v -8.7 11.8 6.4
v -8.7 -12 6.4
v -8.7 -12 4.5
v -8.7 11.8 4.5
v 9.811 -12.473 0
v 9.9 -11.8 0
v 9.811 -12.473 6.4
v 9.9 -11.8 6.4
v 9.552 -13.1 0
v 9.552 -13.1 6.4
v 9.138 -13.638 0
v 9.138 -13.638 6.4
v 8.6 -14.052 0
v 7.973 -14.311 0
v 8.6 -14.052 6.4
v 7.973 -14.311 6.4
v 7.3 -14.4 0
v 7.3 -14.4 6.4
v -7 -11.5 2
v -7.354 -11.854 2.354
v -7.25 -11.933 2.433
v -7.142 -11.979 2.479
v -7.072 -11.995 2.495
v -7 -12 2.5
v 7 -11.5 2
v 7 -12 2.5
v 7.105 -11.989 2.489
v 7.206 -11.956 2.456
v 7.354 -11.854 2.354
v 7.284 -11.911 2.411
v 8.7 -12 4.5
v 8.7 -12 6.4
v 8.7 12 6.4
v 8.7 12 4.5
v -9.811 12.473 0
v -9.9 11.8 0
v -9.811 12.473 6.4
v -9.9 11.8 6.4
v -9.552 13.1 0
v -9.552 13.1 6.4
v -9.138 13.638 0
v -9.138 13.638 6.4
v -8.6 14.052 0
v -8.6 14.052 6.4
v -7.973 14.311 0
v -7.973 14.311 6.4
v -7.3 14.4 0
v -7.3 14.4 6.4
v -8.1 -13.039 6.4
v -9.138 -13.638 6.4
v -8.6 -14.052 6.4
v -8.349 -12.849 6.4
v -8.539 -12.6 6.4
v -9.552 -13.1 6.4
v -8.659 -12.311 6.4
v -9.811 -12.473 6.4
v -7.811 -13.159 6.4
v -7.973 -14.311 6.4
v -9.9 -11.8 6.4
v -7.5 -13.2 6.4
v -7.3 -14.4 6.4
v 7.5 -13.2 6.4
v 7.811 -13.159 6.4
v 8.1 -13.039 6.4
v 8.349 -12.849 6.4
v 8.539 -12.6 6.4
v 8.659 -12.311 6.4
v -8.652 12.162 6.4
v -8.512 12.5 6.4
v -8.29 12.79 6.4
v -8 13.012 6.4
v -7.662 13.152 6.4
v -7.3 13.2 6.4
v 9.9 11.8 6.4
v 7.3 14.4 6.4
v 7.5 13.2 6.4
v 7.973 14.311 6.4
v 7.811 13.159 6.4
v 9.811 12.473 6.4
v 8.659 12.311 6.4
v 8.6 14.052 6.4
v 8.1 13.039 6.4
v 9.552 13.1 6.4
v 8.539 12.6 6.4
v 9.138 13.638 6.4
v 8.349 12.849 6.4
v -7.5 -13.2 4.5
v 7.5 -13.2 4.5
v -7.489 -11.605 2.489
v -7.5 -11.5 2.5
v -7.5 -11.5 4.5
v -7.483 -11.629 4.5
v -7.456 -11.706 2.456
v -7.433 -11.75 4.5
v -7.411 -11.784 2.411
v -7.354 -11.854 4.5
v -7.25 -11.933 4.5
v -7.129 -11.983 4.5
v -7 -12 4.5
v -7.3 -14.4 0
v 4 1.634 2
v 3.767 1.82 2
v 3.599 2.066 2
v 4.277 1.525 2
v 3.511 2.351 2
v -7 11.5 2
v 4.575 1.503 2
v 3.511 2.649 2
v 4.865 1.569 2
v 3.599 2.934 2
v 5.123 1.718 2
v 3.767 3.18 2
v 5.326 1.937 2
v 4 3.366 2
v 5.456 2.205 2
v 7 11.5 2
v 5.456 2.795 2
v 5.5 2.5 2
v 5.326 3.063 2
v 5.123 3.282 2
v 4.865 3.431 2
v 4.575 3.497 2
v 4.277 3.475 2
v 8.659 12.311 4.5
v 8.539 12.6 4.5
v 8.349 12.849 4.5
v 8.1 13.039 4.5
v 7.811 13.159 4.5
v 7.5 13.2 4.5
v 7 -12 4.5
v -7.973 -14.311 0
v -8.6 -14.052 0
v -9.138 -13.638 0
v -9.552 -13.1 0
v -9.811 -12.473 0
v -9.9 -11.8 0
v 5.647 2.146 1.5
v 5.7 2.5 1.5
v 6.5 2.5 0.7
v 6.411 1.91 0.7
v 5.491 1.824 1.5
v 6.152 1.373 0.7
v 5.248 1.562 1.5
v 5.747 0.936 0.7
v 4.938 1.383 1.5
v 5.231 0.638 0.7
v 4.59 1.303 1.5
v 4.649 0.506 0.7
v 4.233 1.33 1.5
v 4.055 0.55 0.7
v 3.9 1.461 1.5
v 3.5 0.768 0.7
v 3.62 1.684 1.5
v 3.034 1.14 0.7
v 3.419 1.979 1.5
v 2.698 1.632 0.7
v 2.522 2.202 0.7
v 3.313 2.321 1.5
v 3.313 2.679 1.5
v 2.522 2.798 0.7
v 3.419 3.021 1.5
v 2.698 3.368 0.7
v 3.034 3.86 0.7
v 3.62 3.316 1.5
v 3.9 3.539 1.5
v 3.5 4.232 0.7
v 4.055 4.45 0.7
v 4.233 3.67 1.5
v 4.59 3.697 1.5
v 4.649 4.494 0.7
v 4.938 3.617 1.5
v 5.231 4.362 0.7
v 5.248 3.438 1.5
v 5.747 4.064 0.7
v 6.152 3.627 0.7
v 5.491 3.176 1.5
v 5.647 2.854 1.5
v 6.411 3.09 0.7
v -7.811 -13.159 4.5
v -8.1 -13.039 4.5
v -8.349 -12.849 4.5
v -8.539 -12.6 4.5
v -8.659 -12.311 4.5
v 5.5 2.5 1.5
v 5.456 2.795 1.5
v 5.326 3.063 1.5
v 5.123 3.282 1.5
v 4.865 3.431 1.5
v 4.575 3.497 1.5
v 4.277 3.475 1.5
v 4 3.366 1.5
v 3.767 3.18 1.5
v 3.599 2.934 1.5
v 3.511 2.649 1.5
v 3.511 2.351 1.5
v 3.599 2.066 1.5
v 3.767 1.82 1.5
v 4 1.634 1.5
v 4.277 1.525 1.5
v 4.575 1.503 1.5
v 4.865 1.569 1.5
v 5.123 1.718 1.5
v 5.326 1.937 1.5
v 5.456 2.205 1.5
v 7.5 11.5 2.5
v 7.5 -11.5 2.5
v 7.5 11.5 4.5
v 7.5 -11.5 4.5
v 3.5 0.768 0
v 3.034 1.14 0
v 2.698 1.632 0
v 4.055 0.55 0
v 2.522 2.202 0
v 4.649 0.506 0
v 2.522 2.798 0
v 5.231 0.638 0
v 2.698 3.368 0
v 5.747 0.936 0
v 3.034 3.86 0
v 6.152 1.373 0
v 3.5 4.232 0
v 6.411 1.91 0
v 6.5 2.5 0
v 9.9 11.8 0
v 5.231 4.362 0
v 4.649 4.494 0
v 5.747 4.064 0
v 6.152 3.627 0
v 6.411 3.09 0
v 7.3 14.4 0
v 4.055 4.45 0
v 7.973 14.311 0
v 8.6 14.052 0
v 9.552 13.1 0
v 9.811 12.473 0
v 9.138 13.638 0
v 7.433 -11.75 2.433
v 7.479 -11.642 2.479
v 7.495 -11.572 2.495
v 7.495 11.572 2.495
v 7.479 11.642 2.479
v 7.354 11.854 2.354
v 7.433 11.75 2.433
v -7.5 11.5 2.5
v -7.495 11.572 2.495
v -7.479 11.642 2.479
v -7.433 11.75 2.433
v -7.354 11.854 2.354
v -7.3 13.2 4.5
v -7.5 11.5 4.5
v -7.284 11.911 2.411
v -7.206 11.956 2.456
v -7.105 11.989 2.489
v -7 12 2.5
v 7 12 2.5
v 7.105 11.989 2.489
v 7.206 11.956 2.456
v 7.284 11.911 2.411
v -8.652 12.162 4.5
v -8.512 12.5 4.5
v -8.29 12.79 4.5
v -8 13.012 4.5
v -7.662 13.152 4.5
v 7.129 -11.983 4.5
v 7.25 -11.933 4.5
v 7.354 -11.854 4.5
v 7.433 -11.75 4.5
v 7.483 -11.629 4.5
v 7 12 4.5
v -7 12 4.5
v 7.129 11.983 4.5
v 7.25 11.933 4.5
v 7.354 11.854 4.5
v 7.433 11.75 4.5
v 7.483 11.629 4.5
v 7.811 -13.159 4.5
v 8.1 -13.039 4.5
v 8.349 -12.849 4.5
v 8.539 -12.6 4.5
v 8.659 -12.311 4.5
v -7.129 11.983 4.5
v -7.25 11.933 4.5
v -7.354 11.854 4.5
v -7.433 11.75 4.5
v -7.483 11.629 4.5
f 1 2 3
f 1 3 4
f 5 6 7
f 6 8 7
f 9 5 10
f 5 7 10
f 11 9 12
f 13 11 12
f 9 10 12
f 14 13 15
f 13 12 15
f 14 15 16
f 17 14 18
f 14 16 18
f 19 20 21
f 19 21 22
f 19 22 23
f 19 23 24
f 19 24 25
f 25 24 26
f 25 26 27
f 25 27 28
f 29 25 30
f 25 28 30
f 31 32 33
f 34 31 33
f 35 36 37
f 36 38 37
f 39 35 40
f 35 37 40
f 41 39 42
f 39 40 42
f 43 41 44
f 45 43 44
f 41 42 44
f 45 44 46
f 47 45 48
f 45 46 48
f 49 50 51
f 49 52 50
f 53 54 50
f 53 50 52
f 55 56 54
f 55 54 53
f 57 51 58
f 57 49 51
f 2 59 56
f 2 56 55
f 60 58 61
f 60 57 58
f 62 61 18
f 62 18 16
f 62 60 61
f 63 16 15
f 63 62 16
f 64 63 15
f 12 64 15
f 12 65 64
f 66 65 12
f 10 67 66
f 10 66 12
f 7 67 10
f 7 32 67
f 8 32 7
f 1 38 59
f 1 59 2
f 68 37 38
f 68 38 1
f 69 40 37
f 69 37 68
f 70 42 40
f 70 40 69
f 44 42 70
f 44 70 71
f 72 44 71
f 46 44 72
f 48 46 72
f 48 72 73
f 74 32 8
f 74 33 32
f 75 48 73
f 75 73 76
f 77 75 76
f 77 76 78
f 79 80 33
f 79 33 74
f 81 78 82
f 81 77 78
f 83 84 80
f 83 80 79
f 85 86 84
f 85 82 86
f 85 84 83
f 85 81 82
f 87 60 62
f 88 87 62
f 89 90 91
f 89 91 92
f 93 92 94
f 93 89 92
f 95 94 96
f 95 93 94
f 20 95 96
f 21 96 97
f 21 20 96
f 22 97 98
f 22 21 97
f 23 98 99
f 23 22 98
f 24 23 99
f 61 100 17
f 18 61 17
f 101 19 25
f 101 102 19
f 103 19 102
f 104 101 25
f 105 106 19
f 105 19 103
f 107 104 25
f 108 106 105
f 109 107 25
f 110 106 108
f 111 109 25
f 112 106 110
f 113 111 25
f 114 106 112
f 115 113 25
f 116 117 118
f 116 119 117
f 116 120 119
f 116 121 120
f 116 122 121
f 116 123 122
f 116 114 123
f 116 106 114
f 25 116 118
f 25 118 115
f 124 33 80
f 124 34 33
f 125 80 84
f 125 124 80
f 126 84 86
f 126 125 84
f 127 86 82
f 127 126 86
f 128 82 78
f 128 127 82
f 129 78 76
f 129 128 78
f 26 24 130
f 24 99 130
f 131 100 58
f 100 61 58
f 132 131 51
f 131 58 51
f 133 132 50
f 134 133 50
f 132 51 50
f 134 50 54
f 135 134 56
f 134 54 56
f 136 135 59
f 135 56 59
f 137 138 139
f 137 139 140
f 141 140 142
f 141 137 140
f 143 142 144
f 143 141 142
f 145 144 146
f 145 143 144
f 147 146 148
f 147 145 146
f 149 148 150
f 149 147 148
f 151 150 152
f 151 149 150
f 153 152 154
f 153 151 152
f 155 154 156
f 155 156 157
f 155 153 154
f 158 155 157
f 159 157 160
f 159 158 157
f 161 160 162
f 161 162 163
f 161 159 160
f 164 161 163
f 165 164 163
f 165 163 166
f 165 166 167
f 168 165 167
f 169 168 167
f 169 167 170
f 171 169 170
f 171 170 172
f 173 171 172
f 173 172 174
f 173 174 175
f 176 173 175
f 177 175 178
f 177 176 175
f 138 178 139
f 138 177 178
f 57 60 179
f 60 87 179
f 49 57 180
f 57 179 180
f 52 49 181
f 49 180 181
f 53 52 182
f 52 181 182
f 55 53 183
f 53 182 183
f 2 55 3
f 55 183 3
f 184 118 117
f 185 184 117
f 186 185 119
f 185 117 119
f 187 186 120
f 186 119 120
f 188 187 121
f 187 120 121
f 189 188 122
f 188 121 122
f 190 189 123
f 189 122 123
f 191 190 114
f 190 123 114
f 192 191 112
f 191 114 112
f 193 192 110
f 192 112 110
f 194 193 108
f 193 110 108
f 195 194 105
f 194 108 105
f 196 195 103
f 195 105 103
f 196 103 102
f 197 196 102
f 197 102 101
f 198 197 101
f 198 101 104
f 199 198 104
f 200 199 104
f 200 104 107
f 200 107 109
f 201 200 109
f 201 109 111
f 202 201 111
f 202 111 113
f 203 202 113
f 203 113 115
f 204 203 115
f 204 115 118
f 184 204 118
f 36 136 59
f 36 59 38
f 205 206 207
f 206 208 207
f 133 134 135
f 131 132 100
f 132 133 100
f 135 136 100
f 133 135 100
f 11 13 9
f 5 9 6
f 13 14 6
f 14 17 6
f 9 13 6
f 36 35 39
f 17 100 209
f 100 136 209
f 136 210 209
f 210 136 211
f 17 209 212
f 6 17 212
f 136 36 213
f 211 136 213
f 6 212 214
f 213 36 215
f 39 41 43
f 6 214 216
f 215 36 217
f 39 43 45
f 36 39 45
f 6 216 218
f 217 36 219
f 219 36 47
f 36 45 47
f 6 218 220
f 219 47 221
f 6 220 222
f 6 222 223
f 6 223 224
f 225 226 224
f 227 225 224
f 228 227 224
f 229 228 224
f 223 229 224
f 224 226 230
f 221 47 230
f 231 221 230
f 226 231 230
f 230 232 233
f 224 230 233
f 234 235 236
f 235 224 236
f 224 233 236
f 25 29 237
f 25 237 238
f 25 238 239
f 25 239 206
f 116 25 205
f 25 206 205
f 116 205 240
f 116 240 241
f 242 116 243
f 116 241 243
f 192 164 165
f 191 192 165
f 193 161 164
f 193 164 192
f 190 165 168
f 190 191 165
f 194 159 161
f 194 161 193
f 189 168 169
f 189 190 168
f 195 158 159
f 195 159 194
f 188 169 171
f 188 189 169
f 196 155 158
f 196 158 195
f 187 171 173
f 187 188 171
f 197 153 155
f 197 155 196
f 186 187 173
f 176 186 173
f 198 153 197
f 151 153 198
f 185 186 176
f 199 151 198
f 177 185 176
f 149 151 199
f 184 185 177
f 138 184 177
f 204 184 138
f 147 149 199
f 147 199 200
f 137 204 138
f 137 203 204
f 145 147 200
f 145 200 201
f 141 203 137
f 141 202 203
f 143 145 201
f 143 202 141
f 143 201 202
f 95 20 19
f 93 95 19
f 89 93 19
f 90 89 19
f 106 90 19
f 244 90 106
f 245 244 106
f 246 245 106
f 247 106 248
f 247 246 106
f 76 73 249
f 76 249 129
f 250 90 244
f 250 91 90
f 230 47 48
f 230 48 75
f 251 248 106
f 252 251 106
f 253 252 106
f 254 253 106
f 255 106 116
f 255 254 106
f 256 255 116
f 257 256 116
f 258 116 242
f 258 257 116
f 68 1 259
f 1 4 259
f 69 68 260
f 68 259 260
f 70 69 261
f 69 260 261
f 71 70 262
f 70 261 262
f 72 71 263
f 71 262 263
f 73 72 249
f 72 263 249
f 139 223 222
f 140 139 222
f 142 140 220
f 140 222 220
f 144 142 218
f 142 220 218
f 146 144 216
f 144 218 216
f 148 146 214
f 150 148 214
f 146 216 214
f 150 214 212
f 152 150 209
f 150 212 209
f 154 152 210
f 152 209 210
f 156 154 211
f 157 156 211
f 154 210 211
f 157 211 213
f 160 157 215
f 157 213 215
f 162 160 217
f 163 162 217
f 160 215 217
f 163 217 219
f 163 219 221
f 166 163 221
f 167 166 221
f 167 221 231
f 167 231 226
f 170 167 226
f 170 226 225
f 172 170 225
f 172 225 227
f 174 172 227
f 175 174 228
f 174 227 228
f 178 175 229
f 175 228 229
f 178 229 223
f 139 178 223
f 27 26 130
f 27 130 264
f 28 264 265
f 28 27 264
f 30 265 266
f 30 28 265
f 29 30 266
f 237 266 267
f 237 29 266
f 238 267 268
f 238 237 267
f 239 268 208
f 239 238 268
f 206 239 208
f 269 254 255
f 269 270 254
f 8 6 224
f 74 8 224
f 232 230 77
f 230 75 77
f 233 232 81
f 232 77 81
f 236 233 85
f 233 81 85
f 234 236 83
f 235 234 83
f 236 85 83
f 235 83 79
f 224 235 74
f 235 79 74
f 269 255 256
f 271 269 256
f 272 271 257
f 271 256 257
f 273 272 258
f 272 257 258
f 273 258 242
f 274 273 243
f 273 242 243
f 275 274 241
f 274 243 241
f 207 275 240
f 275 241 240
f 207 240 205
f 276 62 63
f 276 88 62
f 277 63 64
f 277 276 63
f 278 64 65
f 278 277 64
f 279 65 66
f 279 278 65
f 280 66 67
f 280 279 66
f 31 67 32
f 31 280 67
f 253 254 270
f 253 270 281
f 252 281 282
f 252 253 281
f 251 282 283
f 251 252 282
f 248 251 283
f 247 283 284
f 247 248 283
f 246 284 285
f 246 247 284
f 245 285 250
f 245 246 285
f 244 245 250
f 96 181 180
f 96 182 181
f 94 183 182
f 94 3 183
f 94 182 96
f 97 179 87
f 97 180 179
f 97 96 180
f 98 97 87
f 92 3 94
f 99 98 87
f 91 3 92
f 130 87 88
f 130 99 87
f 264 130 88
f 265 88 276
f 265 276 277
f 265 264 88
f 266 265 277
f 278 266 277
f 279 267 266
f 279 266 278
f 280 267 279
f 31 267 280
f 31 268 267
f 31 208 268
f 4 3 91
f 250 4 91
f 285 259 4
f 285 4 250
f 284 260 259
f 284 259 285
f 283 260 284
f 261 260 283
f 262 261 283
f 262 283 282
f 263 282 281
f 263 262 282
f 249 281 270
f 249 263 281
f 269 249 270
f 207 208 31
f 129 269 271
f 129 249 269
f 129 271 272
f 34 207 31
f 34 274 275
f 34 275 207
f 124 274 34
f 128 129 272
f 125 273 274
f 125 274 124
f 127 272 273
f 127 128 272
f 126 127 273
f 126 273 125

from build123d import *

# Parameters (mm, degrees)
SKETCH_W        = 19.8
SKETCH_H        = 28.8
PAD_DEPTH       = 6.4
SKETCH001_W     = 17.4
SKETCH001_H     = 26.4
POCKET_DEPTH    = 1.9
SKETCH002_W     = 15
SKETCH002_H     = 24
POCKET001_DEPTH = 2.5
SKETCH004_R     = 1
POCKET002_DEPTH = 6.5
CHAMFER_SIZE    = 0.5
CHAMFER001_SIZE = 0.5
CHAMFER002_SIZE = 0.5
CHAMFER003_SIZE = 0.5
FILLET_R        = 1.4
FILLET001_R     = 0.5
FILLET002_R     = 2.6
FILLET003_R     = 0.5
FILLET004_R     = 0.5
FILLET005_R     = 0.5
FILLET006_R     = 1.2
FILLET007_R     = 1.2
FILLET008_R     = 1.2
FILLET009_R     = 2.6
FILLET010_R     = 2.6
FILLET011_R     = 2.6
SKETCH005_R     = 2
POCKET003_DEPTH = 1.5
CHAMFER004_SIZE = 0.8


with BuildPart() as part:
    # Sketch → Pad (new body)
    with BuildSketch(Plane.XY):
        Rectangle(SKETCH_W, SKETCH_H)
    extrude(amount=PAD_DEPTH)

    # Sketch001 (on Face6 of Pad) → Pocket (cut)
    with BuildSketch(Plane.XY.offset(6.4)):
        Rectangle(SKETCH001_W, SKETCH001_H)
    extrude(amount=-POCKET_DEPTH, mode=Mode.SUBTRACT)

    # Sketch002 (on Face11 of Pocket) → Pocket001 (cut)
    with BuildSketch(Plane.XY.offset(4.5)):
        Rectangle(SKETCH002_W, SKETCH002_H)
    extrude(amount=-POCKET001_DEPTH, mode=Mode.SUBTRACT)

    # Sketch004 → Pocket002 (cut)
    with BuildSketch(Plane.XY.offset(6.5)):
        with Locations((4.5, 2.5)):
            Circle(SKETCH004_R)
    extrude(amount=-POCKET002_DEPTH, mode=Mode.SUBTRACT)

    # Chamfer
    chamfer_edges = [part.edges().sort_by_distance(p)[0] for p in [
        (0, 12, 2),
    ]]
    chamfer(chamfer_edges, length=CHAMFER_SIZE)

    # Chamfer001
    chamfer001_edges = [part.edges().sort_by_distance(p)[0] for p in [
        (-7.5, -0.25, 2),
    ]]
    chamfer(chamfer001_edges, length=CHAMFER001_SIZE)

    # Chamfer002
    chamfer002_edges = [part.edges().sort_by_distance(p)[0] for p in [
        (7.5, -0.25, 2),
    ]]
    chamfer(chamfer002_edges, length=CHAMFER002_SIZE)

    # Chamfer003
    chamfer003_edges = [part.edges().sort_by_distance(p)[0] for p in [
        (0, -12, 2),
    ]]
    chamfer(chamfer003_edges, length=CHAMFER003_SIZE)

    # Fillet
    fillet_edges = [part.edges().sort_by_distance(p)[0] for p in [
        (-8.7, 13.2, 5.45),
    ]]
    fillet(fillet_edges, radius=FILLET_R)

    # Fillet001
    fillet001_edges = [part.edges().sort_by_distance(p)[0] for p in [
        (-7.5, 12, 3.5),
    ]]
    fillet(fillet001_edges, radius=FILLET001_R)

    # Fillet002
    fillet002_edges = [part.edges().sort_by_distance(p)[0] for p in [
        (-9.9, 14.4, 3.2),
    ]]
    fillet(fillet002_edges, radius=FILLET002_R)

    # Fillet003
    fillet003_edges = [part.edges().sort_by_distance(p)[0] for p in [
        (7.5, 12, 3.5),
    ]]
    fillet(fillet003_edges, radius=FILLET003_R)

    # Fillet004
    fillet004_edges = [part.edges().sort_by_distance(p)[0] for p in [
        (-7.5, -12, 3.5),
    ]]
    fillet(fillet004_edges, radius=FILLET004_R)

    # Fillet005
    fillet005_edges = [part.edges().sort_by_distance(p)[0] for p in [
        (7.5, -12, 3.5),
    ]]
    fillet(fillet005_edges, radius=FILLET005_R)

    # Fillet006
    fillet006_edges = [part.edges().sort_by_distance(p)[0] for p in [
        (8.7, -13.2, 5.45),
    ]]
    fillet(fillet006_edges, radius=FILLET006_R)

    # Fillet007
    fillet007_edges = [part.edges().sort_by_distance(p)[0] for p in [
        (-8.7, -13.2, 5.45),
    ]]
    fillet(fillet007_edges, radius=FILLET007_R)

    # Fillet008
    fillet008_edges = [part.edges().sort_by_distance(p)[0] for p in [
        (8.7, 13.2, 5.45),
    ]]
    fillet(fillet008_edges, radius=FILLET008_R)

    # Fillet009
    fillet009_edges = [part.edges().sort_by_distance(p)[0] for p in [
        (9.9, 14.4, 3.2),
    ]]
    fillet(fillet009_edges, radius=FILLET009_R)

    # Fillet010
    fillet010_edges = [part.edges().sort_by_distance(p)[0] for p in [
        (9.9, -14.4, 3.2),
    ]]
    fillet(fillet010_edges, radius=FILLET010_R)

    # Fillet011
    fillet011_edges = [part.edges().sort_by_distance(p)[0] for p in [
        (-9.9, -14.4, 3.2),
    ]]
    fillet(fillet011_edges, radius=FILLET011_R)

    # Sketch005 (on Face18 of Fillet011) → Pocket003 (cut)
    with BuildSketch(Plane(origin=(0, 0, 0), x_dir=(1, 0, 0), z_dir=(0, 0, -1))):
        with Locations((4.5, -2.5)):
            Circle(SKETCH005_R)
    extrude(amount=-POCKET003_DEPTH, mode=Mode.SUBTRACT)

    # Chamfer004
    chamfer004_edges = [part.edges().sort_by_distance(p)[0] for p in [
        (2.5, 2.5, 1.5),
    ]]
    chamfer(chamfer004_edges, length=CHAMFER004_SIZE)


solid = part.part
